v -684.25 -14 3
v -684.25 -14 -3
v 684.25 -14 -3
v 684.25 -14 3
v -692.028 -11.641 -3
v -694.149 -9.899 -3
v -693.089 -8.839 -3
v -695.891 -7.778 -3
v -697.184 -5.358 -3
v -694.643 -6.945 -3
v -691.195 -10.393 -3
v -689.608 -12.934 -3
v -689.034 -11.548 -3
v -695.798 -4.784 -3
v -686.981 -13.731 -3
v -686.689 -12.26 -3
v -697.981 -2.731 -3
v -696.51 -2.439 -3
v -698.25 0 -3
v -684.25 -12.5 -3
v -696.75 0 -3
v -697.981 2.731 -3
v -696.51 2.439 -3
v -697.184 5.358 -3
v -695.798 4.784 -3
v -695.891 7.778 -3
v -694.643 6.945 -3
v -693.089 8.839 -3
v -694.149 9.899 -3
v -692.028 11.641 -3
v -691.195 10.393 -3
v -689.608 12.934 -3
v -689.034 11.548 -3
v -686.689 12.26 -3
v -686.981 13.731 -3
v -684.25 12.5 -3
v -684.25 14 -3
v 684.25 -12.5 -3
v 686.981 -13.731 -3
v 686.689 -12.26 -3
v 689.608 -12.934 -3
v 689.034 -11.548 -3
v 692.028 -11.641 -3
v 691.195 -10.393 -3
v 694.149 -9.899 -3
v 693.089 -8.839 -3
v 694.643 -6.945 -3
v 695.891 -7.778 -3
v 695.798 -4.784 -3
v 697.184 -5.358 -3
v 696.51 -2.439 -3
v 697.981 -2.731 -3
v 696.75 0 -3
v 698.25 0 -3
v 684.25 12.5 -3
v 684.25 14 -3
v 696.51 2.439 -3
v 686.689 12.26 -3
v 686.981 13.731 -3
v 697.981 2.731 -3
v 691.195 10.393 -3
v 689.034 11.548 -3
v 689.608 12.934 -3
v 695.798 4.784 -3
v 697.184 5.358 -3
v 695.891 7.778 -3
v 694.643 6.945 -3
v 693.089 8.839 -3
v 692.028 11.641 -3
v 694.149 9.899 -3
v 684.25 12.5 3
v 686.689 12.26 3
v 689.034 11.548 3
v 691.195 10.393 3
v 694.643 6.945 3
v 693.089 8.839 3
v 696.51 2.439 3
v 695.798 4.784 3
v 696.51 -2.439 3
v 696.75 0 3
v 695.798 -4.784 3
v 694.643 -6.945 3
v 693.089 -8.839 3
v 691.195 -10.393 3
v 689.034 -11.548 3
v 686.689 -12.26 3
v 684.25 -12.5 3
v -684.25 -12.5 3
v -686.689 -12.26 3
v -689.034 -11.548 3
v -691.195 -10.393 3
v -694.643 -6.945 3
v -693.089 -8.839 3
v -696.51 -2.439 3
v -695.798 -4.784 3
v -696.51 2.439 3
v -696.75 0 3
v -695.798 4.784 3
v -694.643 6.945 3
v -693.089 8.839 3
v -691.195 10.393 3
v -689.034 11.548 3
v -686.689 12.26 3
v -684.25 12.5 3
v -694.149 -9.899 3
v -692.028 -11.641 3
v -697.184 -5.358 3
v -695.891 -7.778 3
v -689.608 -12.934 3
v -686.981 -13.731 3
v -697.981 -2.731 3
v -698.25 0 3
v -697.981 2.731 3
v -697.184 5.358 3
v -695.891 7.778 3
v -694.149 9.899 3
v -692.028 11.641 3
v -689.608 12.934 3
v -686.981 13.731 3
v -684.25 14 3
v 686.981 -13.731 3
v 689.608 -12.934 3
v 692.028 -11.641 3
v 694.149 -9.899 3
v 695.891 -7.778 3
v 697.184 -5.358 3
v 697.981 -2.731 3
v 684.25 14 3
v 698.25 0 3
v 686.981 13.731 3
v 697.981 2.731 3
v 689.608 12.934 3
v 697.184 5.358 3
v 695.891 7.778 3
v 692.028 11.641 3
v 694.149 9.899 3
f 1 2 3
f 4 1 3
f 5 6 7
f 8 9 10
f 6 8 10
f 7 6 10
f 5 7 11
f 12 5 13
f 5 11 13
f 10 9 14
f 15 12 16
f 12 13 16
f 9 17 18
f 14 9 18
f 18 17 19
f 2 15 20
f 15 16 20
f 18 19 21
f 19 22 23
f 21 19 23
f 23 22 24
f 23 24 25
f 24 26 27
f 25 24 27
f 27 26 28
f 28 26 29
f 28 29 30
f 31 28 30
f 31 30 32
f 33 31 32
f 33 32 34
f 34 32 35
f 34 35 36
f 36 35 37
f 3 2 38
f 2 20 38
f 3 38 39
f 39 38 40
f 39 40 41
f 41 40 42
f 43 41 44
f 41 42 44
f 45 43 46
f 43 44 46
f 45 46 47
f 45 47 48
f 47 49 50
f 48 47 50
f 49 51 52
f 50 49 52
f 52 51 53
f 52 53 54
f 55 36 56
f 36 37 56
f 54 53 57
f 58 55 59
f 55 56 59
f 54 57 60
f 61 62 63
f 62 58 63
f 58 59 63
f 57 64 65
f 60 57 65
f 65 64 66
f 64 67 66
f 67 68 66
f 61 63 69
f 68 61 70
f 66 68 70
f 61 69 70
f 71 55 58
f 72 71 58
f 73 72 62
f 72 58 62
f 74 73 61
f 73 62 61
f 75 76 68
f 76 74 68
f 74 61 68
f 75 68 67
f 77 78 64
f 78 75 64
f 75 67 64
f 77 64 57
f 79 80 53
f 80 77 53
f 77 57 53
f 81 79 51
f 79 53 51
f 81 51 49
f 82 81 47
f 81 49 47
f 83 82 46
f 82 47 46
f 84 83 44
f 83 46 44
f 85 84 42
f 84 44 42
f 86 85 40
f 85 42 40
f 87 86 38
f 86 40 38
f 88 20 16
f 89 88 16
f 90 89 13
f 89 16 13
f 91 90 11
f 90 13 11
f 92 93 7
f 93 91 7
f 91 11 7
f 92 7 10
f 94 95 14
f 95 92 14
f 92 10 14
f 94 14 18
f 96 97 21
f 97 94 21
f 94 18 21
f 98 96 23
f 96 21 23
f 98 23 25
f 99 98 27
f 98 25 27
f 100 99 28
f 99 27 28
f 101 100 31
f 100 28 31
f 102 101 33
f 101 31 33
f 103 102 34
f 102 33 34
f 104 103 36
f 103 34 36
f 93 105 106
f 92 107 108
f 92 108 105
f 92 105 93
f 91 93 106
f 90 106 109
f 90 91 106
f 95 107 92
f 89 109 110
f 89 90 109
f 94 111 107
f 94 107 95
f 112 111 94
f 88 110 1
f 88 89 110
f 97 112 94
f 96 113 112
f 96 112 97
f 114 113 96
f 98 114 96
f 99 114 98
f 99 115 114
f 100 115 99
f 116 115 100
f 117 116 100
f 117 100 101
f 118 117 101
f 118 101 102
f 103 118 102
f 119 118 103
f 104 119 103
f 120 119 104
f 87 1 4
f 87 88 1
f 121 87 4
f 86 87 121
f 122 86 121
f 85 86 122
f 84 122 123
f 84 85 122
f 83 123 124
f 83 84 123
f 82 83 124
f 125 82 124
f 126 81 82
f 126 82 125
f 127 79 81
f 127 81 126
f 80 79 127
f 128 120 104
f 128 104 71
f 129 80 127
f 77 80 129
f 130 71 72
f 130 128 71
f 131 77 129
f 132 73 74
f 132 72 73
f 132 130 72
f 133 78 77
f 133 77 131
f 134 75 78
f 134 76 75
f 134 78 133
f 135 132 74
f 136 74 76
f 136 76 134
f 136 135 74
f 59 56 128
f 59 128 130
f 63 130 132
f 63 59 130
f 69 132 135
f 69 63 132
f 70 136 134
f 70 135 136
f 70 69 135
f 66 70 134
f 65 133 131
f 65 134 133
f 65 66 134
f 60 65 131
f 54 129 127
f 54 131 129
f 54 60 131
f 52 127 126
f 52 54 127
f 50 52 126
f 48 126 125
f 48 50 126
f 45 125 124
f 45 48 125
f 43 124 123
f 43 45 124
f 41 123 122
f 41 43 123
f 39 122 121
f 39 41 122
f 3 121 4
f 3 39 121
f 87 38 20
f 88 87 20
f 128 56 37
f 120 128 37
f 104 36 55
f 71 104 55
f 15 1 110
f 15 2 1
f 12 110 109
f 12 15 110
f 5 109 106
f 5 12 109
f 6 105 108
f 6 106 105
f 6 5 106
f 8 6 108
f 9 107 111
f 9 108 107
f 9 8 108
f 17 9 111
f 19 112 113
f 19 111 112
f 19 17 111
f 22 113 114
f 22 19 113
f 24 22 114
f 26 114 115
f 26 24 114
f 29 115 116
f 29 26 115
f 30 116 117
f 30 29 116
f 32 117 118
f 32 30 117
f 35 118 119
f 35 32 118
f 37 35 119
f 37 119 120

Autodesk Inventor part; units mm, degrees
ref_plane "YZ Plane" through (0, 0, 0) normal (1, 0, 0) x (0, 1, 0)
ref_plane "XZ Plane" through (0, 0, 0) normal (0, 1, 0) x (-1, 0, 0)
ref_plane "XY Plane" through (0, 0, 0) normal (0, 0, 1) x (1, 0, 0)
sketch "Sketch1" plane through (0, 0, 0) normal (0, 0, 1) x (1, 0, 0)
  line L0 (-684.25, 0) -> (684.25, 0) construction
  arc A0 (684.25, 12.5) -> (684.25, -12.5) centre (684.25, 0) ccw construction
  arc A1 (-684.25, -12.5) -> (-684.25, 12.5) centre (-684.25, 0) ccw construction
  arc A2 (684.25, 14) -> (684.25, -14) centre (684.25, 0) ccw construction
  arc A3 (-684.25, -14) -> (-684.25, 14) centre (-684.25, 0) ccw construction
  line L1 (684.25, 14) -> (-684.25, 14)
  line L2 (-684.25, 12.5) -> (684.25, 12.5)
  line L3 (684.25, -12.5) -> (-684.25, -12.5)
  line L4 (-684.25, -14) -> (684.25, -14)
  arc A4 (684.25, -14) -> (684.25, 14) centre (684.25, 0) ccw
  arc A5 (684.25, -12.5) -> (684.25, 12.5) centre (684.25, 0) ccw
  arc A6 (-684.25, 14) -> (-684.25, -14) centre (-684.25, 0) ccw
  arc A7 (-684.25, 12.5) -> (-684.25, -12.5) centre (-684.25, 0) ccw
  point P0 (0, 0)
  point P1 (0, 0)
  dimension "d0" = 1368.5
  dimension "d1" = 25
  dimension "d5" = 14
extrude "Extrusion1" add sketch "Sketch1" along normal mid plane 6
properties part number "correia-gt2"
